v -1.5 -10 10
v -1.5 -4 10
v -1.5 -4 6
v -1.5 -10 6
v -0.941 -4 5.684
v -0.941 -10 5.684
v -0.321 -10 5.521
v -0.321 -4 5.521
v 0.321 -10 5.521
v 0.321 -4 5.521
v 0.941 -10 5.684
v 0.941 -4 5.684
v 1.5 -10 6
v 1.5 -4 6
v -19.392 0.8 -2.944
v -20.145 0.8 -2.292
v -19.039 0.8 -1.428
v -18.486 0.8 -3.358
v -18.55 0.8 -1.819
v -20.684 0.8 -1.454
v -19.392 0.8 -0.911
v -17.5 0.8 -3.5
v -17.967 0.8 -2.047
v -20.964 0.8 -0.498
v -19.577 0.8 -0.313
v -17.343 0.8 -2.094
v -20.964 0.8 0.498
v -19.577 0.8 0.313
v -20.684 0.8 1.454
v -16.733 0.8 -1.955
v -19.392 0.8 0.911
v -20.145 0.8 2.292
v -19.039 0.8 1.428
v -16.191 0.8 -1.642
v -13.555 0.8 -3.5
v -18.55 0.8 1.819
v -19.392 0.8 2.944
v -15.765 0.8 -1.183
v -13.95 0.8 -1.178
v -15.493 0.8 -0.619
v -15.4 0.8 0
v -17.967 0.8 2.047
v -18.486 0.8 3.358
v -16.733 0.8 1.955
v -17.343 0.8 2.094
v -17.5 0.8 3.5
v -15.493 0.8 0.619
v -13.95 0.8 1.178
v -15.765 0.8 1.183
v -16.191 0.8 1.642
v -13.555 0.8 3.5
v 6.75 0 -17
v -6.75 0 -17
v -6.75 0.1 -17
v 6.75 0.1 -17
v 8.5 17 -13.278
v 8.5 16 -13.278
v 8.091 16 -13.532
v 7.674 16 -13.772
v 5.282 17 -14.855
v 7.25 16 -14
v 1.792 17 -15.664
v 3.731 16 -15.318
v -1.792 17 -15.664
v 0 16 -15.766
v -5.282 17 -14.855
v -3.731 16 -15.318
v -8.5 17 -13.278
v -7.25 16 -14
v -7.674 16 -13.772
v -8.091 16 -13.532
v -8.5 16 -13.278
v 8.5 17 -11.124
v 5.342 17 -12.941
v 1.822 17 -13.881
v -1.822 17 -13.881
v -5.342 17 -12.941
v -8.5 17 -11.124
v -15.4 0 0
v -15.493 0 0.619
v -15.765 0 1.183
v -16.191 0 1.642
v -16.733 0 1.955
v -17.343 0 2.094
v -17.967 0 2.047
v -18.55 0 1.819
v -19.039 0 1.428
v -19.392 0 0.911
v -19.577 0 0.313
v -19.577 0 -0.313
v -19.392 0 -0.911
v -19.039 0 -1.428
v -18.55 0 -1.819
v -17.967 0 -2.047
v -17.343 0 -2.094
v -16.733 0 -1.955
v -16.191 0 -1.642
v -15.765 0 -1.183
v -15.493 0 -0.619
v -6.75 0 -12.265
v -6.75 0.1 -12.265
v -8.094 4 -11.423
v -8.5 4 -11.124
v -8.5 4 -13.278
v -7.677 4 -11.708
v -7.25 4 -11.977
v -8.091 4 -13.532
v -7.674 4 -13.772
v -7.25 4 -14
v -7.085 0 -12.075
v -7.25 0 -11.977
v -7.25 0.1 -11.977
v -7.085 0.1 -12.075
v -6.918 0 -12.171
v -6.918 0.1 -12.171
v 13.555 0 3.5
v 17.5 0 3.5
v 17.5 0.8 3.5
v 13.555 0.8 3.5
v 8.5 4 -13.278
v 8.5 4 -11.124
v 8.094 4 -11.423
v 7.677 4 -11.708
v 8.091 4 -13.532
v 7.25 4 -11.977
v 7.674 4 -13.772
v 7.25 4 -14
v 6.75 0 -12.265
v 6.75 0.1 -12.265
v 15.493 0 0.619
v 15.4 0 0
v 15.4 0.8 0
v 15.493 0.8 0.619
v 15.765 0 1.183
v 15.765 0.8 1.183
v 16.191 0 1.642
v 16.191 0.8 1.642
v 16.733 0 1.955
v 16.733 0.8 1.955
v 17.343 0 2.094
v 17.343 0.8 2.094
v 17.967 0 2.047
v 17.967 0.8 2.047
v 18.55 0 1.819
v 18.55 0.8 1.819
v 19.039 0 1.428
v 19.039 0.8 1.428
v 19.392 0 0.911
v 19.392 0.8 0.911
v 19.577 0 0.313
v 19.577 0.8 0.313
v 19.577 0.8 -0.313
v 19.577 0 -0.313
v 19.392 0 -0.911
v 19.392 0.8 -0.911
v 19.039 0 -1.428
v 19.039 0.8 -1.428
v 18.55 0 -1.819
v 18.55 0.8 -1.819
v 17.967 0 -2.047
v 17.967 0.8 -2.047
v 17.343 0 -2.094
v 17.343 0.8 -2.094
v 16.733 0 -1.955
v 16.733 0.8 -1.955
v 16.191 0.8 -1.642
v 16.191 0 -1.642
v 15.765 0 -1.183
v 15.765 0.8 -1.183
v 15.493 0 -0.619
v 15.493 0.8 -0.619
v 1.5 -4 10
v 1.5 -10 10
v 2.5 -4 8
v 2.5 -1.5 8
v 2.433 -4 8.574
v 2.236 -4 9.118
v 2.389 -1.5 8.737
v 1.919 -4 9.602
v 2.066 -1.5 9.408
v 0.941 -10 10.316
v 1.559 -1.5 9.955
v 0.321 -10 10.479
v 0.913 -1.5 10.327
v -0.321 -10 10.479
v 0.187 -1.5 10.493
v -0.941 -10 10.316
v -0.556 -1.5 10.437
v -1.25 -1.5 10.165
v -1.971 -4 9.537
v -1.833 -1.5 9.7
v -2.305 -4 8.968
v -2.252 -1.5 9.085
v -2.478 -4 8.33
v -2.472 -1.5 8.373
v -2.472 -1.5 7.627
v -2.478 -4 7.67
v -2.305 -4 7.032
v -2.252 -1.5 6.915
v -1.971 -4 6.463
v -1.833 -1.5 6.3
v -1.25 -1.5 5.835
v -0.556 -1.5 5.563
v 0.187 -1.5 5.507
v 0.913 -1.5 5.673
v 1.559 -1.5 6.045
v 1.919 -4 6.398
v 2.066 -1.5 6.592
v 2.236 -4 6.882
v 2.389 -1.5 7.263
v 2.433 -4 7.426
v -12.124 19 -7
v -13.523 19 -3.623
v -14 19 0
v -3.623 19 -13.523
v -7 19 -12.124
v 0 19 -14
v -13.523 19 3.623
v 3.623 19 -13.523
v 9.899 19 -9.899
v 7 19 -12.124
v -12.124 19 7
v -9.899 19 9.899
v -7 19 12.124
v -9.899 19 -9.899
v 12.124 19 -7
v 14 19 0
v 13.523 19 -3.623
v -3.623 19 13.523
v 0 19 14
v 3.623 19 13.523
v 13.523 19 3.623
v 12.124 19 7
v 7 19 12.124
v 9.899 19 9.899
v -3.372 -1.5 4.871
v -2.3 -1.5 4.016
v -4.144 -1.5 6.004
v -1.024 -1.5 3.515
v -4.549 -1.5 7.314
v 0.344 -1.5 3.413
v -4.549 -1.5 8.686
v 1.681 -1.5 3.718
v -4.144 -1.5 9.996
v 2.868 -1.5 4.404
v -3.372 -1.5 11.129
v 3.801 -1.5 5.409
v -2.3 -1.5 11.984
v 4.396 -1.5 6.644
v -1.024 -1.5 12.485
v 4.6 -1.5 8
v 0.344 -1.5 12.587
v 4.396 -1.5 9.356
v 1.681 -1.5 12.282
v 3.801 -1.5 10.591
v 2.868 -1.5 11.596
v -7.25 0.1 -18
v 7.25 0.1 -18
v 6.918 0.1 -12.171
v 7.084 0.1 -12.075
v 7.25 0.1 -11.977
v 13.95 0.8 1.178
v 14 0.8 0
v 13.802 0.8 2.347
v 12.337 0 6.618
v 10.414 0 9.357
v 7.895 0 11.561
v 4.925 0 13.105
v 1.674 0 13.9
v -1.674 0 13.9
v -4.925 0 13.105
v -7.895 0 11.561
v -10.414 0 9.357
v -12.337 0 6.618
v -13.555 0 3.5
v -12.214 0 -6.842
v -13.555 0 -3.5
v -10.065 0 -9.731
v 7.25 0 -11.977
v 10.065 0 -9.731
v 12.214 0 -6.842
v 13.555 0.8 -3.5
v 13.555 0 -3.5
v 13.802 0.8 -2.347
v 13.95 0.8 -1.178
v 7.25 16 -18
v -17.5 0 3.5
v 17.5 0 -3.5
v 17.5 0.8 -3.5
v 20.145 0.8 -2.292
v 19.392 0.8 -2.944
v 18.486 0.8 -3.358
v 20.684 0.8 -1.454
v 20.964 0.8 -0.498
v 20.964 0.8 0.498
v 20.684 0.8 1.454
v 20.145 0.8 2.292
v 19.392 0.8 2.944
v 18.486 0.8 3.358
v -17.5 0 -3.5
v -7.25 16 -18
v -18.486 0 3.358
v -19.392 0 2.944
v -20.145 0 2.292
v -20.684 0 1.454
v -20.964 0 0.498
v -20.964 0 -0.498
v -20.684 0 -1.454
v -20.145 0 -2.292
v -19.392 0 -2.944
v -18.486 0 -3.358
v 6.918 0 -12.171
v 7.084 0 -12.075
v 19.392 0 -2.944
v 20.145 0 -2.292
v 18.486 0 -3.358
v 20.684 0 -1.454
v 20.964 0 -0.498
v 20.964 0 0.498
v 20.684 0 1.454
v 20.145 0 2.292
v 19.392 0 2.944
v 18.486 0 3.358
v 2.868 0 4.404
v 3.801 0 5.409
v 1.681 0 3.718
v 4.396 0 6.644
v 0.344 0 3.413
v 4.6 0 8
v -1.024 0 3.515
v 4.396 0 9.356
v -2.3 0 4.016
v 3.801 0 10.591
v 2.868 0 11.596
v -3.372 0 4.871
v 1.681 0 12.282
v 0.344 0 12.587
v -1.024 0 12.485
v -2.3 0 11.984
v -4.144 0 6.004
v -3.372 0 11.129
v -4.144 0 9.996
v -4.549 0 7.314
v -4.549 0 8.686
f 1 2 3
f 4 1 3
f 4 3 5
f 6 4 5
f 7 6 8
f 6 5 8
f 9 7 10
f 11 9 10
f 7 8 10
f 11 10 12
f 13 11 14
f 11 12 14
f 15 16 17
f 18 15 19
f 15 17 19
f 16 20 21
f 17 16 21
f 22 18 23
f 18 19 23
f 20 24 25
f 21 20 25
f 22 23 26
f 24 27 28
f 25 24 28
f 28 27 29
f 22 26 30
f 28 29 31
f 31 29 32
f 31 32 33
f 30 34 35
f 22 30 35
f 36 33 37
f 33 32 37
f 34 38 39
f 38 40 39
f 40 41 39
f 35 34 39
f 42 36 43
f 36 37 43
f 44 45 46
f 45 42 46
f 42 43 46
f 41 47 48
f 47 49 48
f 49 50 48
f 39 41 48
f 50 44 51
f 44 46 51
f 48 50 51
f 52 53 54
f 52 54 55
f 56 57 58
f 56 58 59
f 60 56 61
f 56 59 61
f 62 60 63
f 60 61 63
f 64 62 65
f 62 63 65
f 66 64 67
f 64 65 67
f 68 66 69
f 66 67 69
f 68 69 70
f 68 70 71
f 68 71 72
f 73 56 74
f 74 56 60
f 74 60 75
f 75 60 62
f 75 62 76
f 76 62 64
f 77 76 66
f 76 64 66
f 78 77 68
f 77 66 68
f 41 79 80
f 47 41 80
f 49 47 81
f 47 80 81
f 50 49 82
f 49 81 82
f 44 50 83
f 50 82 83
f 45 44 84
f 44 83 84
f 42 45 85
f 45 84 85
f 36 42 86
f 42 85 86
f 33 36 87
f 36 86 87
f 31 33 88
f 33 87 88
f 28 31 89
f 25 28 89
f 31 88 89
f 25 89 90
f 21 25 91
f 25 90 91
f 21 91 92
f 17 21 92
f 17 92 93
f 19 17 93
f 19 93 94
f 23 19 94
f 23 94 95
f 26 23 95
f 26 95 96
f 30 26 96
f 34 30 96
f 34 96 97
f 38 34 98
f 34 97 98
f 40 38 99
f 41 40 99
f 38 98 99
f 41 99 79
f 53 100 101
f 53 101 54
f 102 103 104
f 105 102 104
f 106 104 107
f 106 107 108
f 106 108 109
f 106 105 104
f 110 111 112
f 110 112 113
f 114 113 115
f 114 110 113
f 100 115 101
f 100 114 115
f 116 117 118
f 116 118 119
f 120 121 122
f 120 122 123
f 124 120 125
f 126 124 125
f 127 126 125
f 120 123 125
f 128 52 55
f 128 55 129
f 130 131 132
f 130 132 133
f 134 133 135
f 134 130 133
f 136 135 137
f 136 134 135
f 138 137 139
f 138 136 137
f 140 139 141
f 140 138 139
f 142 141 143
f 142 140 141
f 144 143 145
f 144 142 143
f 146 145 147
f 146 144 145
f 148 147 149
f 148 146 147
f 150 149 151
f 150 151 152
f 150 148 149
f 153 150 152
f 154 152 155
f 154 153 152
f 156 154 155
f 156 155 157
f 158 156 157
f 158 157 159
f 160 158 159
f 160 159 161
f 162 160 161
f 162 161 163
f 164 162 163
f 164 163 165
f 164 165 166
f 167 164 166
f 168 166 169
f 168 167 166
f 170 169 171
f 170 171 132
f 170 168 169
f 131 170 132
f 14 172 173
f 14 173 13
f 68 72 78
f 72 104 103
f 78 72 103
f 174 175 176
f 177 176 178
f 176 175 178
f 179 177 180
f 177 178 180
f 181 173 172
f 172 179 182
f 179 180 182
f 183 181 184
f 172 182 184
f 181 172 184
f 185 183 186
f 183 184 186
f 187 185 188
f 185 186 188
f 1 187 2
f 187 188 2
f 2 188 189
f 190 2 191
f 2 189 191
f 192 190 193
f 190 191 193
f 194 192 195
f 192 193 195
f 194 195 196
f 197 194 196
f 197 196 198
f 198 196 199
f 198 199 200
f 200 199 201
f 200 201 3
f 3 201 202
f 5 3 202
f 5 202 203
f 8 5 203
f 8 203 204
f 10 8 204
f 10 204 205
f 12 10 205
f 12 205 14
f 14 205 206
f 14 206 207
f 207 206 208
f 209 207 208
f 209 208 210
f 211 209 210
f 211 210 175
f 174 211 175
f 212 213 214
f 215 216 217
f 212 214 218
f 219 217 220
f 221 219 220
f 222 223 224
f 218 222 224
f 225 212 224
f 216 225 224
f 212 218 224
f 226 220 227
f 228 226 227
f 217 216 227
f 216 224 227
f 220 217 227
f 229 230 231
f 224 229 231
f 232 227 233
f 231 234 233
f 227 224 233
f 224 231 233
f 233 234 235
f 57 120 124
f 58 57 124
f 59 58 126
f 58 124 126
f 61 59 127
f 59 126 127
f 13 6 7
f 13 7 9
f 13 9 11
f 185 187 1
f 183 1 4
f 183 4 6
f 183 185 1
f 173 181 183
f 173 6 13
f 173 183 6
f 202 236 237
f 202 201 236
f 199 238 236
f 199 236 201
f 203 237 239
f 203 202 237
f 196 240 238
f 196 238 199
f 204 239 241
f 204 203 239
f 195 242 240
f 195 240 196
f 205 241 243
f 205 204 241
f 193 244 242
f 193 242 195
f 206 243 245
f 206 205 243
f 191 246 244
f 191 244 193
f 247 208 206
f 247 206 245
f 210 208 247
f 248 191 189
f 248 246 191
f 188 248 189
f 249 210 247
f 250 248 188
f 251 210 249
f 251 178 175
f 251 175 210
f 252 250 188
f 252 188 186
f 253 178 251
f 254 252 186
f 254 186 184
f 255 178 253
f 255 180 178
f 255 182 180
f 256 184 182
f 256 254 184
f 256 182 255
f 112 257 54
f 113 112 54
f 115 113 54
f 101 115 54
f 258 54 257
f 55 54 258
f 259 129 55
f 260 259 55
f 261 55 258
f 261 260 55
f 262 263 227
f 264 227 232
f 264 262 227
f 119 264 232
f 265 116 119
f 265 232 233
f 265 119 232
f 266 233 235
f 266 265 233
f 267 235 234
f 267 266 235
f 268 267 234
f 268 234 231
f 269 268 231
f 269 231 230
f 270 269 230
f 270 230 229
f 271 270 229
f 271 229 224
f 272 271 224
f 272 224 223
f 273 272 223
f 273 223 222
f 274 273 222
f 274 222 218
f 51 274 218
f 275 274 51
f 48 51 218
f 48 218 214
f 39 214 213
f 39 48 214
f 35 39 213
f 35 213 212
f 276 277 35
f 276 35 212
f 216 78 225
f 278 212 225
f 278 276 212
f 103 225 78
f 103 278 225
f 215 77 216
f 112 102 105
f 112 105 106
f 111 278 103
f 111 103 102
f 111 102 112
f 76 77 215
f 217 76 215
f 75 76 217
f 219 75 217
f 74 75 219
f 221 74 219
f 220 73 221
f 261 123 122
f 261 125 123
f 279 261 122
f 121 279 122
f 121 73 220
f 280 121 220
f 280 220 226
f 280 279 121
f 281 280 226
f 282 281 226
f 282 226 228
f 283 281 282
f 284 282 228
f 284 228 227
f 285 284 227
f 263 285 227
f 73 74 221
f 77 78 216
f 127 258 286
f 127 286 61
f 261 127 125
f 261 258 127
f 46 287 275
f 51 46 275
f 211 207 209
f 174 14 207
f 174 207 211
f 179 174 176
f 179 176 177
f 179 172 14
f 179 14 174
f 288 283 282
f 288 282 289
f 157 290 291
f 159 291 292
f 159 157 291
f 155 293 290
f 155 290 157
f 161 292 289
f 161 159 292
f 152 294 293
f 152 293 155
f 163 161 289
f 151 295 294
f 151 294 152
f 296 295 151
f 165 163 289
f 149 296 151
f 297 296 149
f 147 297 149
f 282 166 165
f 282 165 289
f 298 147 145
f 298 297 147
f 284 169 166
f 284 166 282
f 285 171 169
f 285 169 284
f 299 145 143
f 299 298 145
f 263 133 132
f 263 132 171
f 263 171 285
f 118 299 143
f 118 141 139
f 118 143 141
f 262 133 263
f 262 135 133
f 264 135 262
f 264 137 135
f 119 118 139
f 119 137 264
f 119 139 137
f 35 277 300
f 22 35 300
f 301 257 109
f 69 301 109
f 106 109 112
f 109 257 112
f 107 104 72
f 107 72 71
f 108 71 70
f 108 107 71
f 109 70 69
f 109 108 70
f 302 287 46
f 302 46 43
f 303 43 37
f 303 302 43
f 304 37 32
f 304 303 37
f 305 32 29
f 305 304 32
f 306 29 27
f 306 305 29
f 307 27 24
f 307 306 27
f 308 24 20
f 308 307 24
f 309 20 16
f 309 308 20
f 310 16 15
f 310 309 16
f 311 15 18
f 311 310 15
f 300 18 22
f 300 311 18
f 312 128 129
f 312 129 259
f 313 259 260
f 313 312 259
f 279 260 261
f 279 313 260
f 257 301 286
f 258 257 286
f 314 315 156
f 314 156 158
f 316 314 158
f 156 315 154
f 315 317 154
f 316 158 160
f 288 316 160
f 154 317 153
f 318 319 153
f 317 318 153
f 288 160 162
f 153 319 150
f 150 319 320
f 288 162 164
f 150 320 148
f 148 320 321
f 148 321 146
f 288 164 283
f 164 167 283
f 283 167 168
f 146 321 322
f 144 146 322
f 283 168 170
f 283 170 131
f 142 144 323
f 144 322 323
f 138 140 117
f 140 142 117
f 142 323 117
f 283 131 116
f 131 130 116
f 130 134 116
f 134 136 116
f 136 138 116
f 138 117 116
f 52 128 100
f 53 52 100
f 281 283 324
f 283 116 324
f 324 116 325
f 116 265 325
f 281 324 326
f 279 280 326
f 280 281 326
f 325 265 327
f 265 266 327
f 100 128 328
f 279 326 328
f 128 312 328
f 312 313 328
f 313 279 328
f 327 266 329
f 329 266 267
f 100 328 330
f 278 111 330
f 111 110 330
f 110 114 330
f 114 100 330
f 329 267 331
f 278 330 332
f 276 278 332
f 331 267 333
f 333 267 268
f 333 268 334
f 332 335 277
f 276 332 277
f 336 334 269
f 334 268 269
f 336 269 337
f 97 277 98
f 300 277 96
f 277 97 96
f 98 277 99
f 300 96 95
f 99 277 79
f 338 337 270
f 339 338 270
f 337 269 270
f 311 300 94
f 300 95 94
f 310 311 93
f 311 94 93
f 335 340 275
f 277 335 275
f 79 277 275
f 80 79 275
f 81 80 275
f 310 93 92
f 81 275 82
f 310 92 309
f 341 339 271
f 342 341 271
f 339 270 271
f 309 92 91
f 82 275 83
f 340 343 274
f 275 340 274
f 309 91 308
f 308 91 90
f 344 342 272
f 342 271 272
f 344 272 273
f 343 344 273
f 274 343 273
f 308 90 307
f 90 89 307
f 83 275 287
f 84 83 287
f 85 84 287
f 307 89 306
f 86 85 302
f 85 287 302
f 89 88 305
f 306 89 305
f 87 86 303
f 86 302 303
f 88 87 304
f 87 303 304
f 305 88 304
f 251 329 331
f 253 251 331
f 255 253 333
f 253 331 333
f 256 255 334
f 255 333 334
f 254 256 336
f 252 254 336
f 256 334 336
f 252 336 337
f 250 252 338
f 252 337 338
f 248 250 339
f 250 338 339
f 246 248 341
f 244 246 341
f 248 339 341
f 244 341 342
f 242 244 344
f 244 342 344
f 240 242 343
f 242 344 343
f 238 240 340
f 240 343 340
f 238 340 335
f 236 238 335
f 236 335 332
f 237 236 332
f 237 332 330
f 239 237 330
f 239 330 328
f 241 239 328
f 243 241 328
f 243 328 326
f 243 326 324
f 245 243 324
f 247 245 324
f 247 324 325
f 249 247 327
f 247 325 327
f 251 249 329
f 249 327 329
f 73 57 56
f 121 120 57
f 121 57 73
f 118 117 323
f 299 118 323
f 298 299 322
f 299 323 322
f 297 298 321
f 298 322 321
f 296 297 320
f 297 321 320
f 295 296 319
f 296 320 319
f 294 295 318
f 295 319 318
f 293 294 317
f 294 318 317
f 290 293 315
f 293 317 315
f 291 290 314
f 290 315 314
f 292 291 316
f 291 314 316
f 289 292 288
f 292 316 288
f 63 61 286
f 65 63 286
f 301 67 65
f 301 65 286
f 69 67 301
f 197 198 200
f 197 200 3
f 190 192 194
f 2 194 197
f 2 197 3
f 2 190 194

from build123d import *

# Parameters (mm, degrees)
SKETCH010_R     = 14
PAD005_DEPTH    = 19
SKETCH011_W     = 14.5
SKETCH011_H     = 6.02346
PAD006_DEPTH    = 16
SKETCH012_R     = 2.1
PAD007_DEPTH    = 0.8
SKETCH013_R     = 4.6
PAD008_DEPTH    = 1.5
SKETCH014_R     = 2.5
PAD009_DEPTH    = 2.5
PAD010_DEPTH    = 6
PAD011_DEPTH    = 12
PAD012_DEPTH    = 1
POCKET006_DEPTH = 0.1


with BuildPart() as part:
    # Sketch010 → Pad005 (new body)
    with BuildSketch(Plane.XZ):
        Circle(SKETCH010_R)
    extrude(amount=-PAD005_DEPTH)

    # Sketch011 (on Face2 of Pad005) → Pad006 (join)
    with BuildSketch(Plane.XZ):
        with Locations((0, -14.98827)):
            Rectangle(SKETCH011_W, SKETCH011_H)
    extrude(amount=-PAD006_DEPTH)

    # Sketch012 (on Face7 of Pad006) → Pad007 (join)
    with BuildSketch(Plane.XZ):
        with BuildLine():
            ThreePointArc((-17.5, 3.5), (-21, 0), (-17.5, -3.5))
            Line((-13.555442, -3.5), (-17.5, -3.5))
            Line((-13.555442, 3.5), (-13.555442, -3.5))
            Line((-17.5, 3.5), (-13.555442, 3.5))
        make_face()
        with Locations((-17.5, 0)):
            Circle(SKETCH012_R, mode=Mode.SUBTRACT)
    pad007 = extrude(amount=-PAD007_DEPTH)

    # Mirrored: Pad007 across Sketch012 V_Axis
    add(pad007.mirror(Plane(origin=(0, 0, 0), x_dir=(0, -1, 0), z_dir=(1, 0, 0))))

    # Sketch013 (on Face17 of Mirrored) → Pad008 (join)
    with BuildSketch(Plane.XZ):
        with Locations((0, 8)):
            Circle(SKETCH013_R)
    extrude(amount=PAD008_DEPTH)

    # Sketch014 (on Face19 of Pad008) → Pad009 (join)
    with BuildSketch(Plane.XZ.offset(1.5)):
        with Locations((0, 8)):
            Circle(SKETCH014_R)
    extrude(amount=PAD009_DEPTH)

    # Sketch015 (on Face21 of Pad009) → Pad010 (join)
    with BuildSketch(Plane.XZ.offset(4)):
        with BuildLine():
            Line((-1.5, 10), (-1.5, 6))
            ThreePointArc((-1.5, 6), (0, 5.5), (1.5, 6))
            Line((1.5, 10), (1.5, 6))
            ThreePointArc((1.5, 10), (0, 10.5), (-1.5, 10))
        make_face()
    extrude(amount=PAD010_DEPTH)

    # Sketch016 (on DatumPlane) → Pad011 (join)
    with BuildSketch(Plane.XZ.offset(-4)):
        with BuildLine():
            ThreePointArc((-8.5, -13.278272), (-7.883264, -13.653448), (-7.25, -14))
            Line((-7.25, -14), (-7.25, -11.97654))
            ThreePointArc((-8.5, -11.124298), (-7.88652, -11.567316), (-7.25, -11.97654))
            Line((-8.5, -13.278272), (-8.5, -11.124298))
        make_face()
    pad011 = extrude(amount=-PAD011_DEPTH)

    # Mirrored001: Pad011 across Sketch016 V_Axis
    add(pad011.mirror(Plane(origin=(0, 4, 0), x_dir=(0, -1, 0), z_dir=(1, 0, 0))))

    # Sketch017 (on Face31 of Mirrored001) → Pad012 (join)
    with BuildSketch(Plane(origin=(0, 16, 0), x_dir=(1, 0, 0), z_dir=(0, 1, 0))):
        with BuildLine():
            ThreePointArc((8.5, 11.124298), (0, 14), (-8.5, 11.124298))
            Line((-8.5, 13.278272), (-8.5, 11.124298))
            ThreePointArc((8.5, 13.278272), (0, 15.765865), (-8.5, 13.278272))
            Line((8.5, 13.278272), (8.5, 11.124298))
        make_face()
    extrude(amount=PAD012_DEPTH)

    # Sketch018 (on Face9 of Pad012) → Pocket006 (cut)
    with BuildSketch(Plane.XZ):
        with BuildLine():
            Line((-7.25, -11.97654), (-7.25, -18))
            Line((7.25, -18), (-7.25, -18))
            Line((7.25, -18), (7.25, -11.97654))
            ThreePointArc((6.75, -12.265297), (7.001278, -12.123131), (7.25, -11.97654))
            Line((6.75, -17), (6.75, -12.265297))
            Line((-6.75, -17), (6.75, -17))
            Line((-6.75, -12.265297), (-6.75, -17))
            ThreePointArc((-7.25, -11.97654), (-7.001489, -12.123496), (-6.75, -12.265297))
        make_face()
    extrude(amount=-POCKET006_DEPTH, mode=Mode.SUBTRACT)


solid = part.part
